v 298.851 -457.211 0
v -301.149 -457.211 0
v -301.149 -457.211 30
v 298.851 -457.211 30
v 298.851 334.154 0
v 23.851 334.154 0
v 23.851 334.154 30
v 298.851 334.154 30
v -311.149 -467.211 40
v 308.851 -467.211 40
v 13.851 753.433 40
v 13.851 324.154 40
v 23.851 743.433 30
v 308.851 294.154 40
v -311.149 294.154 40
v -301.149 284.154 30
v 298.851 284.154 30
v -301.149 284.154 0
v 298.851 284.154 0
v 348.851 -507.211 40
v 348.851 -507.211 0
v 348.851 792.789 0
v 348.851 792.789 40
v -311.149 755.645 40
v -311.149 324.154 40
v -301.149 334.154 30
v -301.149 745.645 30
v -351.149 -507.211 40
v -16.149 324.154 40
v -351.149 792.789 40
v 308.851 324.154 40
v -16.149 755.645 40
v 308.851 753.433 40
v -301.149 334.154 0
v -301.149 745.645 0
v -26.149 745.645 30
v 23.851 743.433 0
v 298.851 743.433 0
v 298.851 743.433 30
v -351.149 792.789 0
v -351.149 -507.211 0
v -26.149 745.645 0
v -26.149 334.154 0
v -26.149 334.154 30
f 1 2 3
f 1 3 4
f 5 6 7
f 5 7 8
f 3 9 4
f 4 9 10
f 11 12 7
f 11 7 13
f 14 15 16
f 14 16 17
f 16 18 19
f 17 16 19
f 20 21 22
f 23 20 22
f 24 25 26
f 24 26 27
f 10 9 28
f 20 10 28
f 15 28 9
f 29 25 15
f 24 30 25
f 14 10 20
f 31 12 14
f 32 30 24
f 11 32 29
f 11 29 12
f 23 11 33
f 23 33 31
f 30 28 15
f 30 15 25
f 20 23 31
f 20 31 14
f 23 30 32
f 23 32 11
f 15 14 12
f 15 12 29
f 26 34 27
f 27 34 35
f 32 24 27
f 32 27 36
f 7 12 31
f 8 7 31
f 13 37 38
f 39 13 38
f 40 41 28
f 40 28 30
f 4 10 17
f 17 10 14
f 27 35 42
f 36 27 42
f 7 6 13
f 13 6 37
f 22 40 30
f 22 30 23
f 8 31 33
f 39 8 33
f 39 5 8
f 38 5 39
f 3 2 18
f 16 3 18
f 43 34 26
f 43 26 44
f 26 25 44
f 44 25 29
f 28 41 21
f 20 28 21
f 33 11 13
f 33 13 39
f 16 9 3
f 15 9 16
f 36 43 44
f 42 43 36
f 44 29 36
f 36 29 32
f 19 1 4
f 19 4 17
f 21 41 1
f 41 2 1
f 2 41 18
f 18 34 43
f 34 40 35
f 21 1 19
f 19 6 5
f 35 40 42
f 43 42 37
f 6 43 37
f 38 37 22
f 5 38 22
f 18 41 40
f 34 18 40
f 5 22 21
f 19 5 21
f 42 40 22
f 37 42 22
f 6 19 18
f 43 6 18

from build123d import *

# Parameters (mm, degrees)
F0_W     = 700
F0_H     = 1300
F0_W_2   = 600
F0_H_2   = 741.365468
F0_W_3   = 275
F0_H_3   = 411.491126
F0_H_4   = 409.27878
F1_DEPTH = 40
F2_SIZE  = 10


with BuildPart() as f1:
    # F0 (on Top) → F1 (new body)
    with BuildSketch(Plane.XY):
        with Locations((-1.148704, 142.788631)):
            Rectangle(F0_W, F0_H)
        with Locations((-1.148704, -86.528635)):
            Rectangle(F0_W_2, F0_H_2, mode=Mode.SUBTRACT)
        with Locations((-163.648704, 539.899662)):
            Rectangle(F0_W_3, F0_H_3, mode=Mode.SUBTRACT)
        with Locations((161.351296, 538.793489)):
            Rectangle(F0_W_3, F0_H_4, mode=Mode.SUBTRACT)
    extrude(amount=F1_DEPTH)

    # F2
    f2_edges = [f1.edges().sort_by_distance(p)[0] for p in [
        (-1.148704, -457.211369, 40),
        (298.851296, -86.528635, 40),
        (-1.148704, 284.154099, 40),
        (-301.148704, -86.528635, 40),
        (23.851296, 538.793489, 40),
        (161.351296, 334.154099, 40),
        (-163.648704, 334.154099, 40),
        (-26.148704, 539.899662, 40),
        (298.851296, 538.793489, 40),
        (-301.148704, 539.899662, 40),
        (-163.648704, 745.645225, 40),
        (161.351296, 743.432879, 40),
    ]]
    chamfer(f2_edges, length=F2_SIZE)


solid = f1.part
